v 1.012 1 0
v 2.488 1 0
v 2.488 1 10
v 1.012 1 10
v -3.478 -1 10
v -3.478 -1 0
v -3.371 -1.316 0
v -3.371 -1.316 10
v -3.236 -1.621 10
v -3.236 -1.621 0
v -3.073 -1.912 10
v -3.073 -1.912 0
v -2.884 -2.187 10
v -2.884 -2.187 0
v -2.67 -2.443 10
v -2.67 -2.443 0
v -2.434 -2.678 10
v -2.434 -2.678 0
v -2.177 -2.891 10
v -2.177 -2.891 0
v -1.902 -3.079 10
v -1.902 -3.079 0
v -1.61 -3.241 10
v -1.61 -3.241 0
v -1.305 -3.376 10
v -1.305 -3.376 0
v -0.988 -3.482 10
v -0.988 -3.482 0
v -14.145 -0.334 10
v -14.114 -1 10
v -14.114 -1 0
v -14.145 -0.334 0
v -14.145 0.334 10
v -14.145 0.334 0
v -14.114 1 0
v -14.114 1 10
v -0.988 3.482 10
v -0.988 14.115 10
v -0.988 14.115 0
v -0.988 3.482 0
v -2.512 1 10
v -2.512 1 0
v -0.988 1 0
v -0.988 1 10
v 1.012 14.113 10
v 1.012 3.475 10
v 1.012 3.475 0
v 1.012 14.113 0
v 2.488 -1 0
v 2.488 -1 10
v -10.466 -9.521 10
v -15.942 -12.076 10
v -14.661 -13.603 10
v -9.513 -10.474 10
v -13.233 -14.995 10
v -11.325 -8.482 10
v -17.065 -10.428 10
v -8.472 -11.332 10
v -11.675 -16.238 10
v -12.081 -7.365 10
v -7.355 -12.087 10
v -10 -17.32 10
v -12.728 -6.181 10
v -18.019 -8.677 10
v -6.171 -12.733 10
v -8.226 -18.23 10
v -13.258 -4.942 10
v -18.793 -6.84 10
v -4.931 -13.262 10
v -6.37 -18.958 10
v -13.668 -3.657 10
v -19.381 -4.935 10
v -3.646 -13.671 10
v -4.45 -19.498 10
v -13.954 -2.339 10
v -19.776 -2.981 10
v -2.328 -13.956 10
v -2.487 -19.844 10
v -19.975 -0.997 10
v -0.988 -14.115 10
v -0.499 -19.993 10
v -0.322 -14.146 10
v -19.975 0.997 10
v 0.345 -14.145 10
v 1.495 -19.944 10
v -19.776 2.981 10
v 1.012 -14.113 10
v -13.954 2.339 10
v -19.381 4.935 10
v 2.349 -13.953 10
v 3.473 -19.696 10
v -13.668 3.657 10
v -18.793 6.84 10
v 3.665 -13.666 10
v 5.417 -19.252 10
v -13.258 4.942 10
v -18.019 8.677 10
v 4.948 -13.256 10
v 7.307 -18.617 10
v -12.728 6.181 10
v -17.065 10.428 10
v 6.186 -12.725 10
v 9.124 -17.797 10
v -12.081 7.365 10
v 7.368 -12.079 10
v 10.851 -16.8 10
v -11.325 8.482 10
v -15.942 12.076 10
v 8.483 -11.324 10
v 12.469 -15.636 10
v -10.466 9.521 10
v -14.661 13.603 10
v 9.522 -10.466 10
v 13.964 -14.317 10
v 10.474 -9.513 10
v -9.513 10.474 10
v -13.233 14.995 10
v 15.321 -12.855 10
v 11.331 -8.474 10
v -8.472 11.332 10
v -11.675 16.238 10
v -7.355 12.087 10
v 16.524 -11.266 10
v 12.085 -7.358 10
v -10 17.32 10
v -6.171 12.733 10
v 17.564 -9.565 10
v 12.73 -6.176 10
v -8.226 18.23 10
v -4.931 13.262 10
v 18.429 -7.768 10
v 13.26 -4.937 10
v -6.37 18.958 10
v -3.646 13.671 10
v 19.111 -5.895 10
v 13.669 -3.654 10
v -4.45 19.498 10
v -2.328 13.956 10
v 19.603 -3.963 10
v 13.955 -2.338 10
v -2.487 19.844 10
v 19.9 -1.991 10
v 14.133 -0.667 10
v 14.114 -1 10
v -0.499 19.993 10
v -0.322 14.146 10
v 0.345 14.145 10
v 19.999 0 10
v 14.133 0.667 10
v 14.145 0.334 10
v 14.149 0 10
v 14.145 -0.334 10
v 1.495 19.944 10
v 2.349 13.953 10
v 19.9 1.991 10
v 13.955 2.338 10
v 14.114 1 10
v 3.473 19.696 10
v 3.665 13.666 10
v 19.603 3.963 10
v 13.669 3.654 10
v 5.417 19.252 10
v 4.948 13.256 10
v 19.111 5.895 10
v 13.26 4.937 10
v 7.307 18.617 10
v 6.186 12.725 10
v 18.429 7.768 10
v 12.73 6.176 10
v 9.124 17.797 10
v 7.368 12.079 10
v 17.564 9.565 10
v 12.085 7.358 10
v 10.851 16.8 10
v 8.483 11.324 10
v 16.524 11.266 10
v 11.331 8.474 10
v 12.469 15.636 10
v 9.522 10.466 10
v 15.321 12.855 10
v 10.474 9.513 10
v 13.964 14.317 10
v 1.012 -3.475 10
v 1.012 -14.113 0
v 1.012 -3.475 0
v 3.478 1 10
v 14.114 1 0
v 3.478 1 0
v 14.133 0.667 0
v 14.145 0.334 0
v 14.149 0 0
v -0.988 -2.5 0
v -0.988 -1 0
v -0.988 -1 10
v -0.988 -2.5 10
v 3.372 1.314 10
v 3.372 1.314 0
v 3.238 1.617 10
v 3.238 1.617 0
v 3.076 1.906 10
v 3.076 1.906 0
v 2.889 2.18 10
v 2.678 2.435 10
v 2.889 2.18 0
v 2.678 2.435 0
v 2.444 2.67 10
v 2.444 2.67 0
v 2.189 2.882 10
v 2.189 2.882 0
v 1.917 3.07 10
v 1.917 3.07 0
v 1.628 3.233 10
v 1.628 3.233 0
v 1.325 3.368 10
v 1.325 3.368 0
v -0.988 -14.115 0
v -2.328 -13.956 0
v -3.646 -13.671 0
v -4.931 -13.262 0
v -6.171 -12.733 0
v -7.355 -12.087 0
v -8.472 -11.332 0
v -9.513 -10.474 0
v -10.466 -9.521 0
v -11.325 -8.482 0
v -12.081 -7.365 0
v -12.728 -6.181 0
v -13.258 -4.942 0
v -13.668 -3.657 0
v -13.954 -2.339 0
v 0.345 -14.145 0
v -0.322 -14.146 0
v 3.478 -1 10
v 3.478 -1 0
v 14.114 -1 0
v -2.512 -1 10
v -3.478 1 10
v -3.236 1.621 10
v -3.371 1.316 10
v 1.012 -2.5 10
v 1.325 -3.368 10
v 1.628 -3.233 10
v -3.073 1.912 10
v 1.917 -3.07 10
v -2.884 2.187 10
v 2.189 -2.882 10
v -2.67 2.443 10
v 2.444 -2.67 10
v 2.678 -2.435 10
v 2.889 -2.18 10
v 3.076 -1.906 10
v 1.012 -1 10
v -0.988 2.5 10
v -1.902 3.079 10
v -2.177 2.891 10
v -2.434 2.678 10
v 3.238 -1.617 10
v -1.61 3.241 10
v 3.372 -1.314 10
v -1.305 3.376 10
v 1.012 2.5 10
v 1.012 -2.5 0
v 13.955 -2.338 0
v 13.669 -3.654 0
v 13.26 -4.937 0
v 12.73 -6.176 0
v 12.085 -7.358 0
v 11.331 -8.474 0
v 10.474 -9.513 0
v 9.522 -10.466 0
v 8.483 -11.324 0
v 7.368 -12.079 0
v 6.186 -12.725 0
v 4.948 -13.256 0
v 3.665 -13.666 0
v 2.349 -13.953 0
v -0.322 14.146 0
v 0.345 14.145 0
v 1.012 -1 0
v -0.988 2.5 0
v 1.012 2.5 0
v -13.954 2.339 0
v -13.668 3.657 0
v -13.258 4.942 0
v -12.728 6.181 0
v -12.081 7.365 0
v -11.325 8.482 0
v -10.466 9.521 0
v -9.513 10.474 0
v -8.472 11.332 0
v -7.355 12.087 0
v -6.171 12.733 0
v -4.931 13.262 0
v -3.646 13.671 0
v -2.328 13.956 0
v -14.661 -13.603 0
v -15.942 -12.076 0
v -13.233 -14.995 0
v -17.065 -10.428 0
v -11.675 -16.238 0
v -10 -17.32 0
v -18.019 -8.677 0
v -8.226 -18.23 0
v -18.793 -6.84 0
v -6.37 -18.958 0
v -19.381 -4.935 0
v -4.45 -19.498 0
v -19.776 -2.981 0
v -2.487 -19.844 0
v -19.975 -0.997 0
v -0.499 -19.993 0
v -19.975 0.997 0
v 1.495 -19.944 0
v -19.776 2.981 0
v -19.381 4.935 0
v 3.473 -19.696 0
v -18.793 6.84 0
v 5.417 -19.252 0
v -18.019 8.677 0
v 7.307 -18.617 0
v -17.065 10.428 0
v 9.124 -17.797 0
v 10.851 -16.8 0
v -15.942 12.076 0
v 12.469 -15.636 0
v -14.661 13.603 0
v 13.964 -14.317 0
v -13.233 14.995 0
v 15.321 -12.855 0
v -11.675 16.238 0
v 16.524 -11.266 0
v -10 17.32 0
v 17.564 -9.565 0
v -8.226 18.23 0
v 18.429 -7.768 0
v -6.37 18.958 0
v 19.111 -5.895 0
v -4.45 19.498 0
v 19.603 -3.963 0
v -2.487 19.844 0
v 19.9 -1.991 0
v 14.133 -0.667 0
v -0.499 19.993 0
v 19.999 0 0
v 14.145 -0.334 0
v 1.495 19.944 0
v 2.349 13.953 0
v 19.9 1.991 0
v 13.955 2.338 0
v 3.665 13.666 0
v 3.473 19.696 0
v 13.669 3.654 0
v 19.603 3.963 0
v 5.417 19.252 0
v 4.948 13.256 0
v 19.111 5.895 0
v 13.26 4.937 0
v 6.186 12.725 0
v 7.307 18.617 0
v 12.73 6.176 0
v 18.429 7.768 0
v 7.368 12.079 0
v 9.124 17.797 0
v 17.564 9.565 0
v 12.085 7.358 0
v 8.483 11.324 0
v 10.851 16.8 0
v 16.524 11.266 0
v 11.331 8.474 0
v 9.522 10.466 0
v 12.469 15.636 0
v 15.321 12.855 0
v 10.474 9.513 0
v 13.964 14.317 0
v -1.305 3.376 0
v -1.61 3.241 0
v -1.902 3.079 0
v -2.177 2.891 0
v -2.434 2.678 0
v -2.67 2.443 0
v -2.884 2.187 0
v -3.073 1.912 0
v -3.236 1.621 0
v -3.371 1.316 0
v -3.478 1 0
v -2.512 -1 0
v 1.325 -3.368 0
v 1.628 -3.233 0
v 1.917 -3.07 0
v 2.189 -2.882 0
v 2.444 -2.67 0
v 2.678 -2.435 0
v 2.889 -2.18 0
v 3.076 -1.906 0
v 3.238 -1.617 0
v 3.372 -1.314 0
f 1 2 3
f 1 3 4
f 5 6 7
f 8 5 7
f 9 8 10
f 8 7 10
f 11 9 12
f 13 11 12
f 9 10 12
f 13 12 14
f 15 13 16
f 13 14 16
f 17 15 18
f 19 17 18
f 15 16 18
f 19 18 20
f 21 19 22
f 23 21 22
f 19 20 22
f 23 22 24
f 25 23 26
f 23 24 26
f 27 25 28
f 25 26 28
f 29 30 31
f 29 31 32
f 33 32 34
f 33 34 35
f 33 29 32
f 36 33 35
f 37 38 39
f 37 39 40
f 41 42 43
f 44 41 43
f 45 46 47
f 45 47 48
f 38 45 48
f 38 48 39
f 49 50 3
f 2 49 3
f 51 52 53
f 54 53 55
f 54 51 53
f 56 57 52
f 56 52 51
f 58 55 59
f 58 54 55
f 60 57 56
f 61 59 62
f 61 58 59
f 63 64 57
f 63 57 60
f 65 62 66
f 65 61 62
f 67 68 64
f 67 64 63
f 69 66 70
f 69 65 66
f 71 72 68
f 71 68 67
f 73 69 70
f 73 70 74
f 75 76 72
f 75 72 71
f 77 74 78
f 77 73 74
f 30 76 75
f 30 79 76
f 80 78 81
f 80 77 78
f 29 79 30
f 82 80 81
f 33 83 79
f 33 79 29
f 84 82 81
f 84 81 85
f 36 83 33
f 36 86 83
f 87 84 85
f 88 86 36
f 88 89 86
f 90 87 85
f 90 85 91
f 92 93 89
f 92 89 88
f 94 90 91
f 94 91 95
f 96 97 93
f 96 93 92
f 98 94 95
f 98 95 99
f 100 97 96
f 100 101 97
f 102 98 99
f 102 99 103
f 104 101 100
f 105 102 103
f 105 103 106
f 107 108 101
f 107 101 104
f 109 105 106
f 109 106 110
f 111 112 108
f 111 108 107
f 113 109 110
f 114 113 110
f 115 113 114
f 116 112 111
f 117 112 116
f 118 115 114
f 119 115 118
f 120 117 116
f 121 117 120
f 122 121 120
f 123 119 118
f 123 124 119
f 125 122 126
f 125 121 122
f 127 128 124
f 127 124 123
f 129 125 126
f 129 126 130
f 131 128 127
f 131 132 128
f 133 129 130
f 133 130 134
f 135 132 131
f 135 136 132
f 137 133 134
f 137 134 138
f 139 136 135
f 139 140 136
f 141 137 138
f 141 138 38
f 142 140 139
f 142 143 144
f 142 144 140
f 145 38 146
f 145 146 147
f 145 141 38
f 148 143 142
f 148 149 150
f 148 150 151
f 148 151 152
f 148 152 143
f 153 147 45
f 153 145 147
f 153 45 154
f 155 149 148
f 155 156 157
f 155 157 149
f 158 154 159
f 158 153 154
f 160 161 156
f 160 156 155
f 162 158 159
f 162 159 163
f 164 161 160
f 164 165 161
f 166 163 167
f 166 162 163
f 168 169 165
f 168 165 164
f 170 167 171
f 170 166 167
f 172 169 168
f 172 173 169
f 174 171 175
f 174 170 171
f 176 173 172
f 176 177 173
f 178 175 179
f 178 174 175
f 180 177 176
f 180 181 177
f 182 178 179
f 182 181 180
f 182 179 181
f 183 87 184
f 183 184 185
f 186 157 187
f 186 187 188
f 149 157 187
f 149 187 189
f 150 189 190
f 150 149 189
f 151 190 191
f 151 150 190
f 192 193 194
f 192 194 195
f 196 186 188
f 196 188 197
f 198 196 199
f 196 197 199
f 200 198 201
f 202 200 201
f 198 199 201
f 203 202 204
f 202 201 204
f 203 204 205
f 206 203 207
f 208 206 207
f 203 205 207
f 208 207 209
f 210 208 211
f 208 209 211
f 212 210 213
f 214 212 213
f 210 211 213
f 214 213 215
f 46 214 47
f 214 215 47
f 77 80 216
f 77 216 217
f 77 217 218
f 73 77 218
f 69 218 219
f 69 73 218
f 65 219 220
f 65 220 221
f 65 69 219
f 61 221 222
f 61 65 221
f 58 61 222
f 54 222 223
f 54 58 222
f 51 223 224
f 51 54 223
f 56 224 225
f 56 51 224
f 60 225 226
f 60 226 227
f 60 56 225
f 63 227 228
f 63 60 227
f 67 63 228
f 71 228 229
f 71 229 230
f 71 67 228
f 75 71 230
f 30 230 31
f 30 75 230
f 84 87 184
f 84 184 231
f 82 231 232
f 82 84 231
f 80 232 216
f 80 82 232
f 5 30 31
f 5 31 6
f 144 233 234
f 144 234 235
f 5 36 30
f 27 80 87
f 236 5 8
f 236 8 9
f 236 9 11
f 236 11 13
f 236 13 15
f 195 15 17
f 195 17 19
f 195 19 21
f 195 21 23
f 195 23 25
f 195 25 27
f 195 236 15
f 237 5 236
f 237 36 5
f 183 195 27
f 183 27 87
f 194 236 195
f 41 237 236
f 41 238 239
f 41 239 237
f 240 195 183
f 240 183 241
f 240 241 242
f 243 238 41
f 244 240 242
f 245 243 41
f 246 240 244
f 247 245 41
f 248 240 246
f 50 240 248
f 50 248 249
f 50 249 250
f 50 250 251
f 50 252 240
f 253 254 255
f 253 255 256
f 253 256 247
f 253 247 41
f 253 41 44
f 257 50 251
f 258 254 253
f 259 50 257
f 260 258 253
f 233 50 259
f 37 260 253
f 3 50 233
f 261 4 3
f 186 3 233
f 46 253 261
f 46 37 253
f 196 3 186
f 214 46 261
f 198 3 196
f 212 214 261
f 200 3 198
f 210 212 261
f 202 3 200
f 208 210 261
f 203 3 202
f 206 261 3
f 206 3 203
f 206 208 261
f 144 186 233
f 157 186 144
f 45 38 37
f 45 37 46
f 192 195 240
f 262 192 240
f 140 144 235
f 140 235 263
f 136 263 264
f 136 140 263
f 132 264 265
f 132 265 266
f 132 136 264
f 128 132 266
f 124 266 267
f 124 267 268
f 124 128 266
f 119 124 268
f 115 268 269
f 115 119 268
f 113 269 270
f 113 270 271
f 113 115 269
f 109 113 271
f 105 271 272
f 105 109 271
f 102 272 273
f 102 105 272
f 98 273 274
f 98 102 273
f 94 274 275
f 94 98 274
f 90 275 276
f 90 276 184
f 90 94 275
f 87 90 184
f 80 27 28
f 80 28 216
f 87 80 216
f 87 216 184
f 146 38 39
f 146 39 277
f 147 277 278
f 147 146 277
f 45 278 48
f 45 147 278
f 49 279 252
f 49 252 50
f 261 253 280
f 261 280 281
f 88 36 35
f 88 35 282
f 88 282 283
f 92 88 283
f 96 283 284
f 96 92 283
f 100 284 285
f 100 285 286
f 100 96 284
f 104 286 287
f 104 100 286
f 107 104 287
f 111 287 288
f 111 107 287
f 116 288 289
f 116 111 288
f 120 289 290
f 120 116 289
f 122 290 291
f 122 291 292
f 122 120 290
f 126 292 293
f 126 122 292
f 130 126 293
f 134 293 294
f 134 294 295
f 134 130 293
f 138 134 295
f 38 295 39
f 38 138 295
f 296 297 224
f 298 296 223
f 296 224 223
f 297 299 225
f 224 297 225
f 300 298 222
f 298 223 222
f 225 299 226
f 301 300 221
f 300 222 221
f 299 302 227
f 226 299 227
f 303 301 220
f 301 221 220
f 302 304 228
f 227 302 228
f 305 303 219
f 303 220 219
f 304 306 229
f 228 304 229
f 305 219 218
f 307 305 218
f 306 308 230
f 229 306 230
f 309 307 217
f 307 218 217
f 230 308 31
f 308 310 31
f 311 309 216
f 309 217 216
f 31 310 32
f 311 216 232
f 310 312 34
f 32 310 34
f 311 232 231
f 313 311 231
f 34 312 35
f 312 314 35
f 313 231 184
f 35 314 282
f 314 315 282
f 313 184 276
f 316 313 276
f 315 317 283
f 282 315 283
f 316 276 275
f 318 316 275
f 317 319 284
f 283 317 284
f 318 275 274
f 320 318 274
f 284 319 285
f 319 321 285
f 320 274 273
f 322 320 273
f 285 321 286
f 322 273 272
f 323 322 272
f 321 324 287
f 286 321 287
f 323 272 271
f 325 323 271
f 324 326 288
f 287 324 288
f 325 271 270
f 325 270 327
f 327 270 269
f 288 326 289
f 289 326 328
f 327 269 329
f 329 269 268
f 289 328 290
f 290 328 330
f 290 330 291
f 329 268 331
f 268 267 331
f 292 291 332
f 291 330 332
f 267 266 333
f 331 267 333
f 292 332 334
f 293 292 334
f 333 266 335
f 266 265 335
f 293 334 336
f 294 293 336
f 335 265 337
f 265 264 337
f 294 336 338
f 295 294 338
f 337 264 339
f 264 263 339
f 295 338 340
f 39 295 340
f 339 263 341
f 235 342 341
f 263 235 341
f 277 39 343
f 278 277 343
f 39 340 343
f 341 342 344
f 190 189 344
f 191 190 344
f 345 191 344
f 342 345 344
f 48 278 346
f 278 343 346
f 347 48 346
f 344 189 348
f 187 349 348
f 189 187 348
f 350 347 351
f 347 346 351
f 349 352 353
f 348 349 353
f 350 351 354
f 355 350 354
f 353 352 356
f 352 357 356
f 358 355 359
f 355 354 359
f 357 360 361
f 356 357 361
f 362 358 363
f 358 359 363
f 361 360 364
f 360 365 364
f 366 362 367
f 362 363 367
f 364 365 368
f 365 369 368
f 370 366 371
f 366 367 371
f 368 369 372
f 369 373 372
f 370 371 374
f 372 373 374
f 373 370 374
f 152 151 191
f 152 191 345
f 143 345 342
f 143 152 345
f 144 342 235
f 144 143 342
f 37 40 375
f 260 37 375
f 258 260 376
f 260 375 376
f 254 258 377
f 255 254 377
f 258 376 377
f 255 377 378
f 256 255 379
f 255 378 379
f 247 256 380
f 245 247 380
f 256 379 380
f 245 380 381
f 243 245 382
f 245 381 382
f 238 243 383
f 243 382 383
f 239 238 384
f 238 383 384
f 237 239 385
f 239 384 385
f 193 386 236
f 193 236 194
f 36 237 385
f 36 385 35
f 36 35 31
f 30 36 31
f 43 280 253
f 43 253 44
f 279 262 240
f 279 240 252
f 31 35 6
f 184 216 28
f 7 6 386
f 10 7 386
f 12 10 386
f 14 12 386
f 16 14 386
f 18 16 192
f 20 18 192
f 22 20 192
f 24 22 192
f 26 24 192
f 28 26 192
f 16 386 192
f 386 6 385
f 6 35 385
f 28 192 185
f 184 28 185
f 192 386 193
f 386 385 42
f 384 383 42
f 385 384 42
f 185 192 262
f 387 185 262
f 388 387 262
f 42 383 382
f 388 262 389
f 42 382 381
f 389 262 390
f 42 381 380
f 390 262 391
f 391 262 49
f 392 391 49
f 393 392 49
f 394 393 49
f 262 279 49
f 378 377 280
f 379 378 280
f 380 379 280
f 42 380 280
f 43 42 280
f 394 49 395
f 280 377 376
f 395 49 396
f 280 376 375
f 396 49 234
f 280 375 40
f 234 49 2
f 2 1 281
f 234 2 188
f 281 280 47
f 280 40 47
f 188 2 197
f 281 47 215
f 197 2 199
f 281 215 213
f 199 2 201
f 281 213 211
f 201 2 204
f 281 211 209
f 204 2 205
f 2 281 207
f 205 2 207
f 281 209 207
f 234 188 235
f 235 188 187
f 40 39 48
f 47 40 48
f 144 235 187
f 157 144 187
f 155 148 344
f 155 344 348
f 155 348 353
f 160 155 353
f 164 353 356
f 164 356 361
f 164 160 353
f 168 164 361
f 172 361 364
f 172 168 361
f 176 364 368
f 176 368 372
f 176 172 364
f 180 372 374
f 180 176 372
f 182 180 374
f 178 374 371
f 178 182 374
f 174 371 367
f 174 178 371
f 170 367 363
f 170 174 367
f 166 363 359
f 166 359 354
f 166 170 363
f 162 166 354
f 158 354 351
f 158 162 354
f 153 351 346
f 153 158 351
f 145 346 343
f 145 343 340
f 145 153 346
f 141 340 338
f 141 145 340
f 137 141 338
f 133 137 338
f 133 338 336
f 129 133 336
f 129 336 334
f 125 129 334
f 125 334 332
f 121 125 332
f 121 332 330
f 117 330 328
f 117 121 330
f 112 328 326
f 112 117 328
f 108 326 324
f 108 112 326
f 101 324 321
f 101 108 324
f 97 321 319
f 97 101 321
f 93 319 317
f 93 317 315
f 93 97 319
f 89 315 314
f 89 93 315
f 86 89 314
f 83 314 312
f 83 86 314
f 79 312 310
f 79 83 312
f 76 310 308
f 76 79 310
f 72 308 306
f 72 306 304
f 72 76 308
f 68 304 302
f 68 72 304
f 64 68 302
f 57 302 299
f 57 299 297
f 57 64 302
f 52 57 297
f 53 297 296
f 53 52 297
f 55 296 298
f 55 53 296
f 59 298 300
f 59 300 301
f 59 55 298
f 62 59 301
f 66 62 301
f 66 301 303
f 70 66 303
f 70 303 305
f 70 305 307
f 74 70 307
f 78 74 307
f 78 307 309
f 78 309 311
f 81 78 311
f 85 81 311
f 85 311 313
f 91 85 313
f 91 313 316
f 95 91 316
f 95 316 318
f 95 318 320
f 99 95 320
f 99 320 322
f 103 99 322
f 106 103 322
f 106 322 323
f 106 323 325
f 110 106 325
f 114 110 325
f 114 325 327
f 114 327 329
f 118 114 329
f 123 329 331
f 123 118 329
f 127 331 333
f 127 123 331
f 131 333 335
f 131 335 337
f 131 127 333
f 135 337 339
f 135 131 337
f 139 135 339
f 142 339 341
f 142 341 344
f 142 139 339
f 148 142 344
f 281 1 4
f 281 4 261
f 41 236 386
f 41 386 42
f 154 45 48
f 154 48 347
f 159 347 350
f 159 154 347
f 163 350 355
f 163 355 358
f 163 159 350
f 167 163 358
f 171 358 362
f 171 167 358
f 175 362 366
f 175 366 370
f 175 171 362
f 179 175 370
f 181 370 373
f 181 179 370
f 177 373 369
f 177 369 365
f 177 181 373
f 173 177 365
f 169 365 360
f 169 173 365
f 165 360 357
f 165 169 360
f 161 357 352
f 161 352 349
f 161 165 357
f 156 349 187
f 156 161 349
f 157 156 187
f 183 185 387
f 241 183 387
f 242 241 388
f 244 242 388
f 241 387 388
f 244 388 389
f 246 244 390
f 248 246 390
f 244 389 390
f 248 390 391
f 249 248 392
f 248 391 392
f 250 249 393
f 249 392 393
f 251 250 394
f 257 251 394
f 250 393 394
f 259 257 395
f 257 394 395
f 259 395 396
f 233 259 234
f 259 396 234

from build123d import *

# Parameters (mm, degrees)
F1_R     = 3.619217407
F2_DEPTH = 10
F0_W     = 2
F0_H     = 2
F0_W_2   = 1.4766840935
F0_H_2   = 1.5
F0_W_3   = 1.5233159065
F3_DEPTH = 10
F5_DEPTH = 10
F4_R     = 19.9994931562


# Not quite as in the source:
# - a feature names something its author has since deleted; it is built from what else it names


with BuildPart() as f2:
    # F1 (on Top) → F2 (new body)
    with BuildSketch(Plane.XY):
        Circle(F1_R)
    extrude(amount=F2_DEPTH)

    # F0 (on Top) → F3 (cut)
    with BuildSketch(Plane.XY):
        with Locations((0.0116579533, 0)):
            Rectangle(F0_W, F0_H)
        with Locations((1.75, 0)):
            Rectangle(F0_W_2, F0_H)
        with Locations((0.0116579533, -1.75)):
            Rectangle(F0_W, F0_H_2)
        with Locations((0.0116579533, 1.75)):
            Rectangle(F0_W, F0_H_2)
        with Locations((-1.75, 0)):
            Rectangle(F0_W_3, F0_H)
    extrude(amount=F3_DEPTH, mode=Mode.SUBTRACT)

    # F4 (on face) → F5 (join)
    with BuildSketch(Plane.XY.offset(10)):
        with BuildLine():
            Line((1.0116579533, 3.4749507658), (1.0116579533, 14.1129590508))
            Line((1.0116579533, 14.1129590508), (-0.9883420467, 14.1146110461))
            Line((-0.9883420467, 14.1146110461), (-0.9883420467, 3.4816540089))
            ThreePointArc((-0.9883420467, 3.4816540089), (0.0121301789, 3.6191970791), (1.0116579533, 3.4749507658))
        make_face()
        with BuildLine():
            Line((14.1137898874, -1), (14.1137898874, 1))
            Line((14.1137898874, 1), (3.4783235385, 1))
            ThreePointArc((3.4783235385, 1), (3.5838208477, 0.5049383829), (3.619217407, 0))
            ThreePointArc((3.619217407, 0), (3.5838208477, -0.5049383829), (3.4783235385, -1))
            Line((3.4783235385, -1), (14.1137898874, -1))
        make_face()
        with BuildLine():
            Line((-0.9883420467, -14.1146110461), (1.0116579533, -14.1129590508))
            Line((1.0116579533, -14.1129590508), (1.0116579533, -3.4749507658))
            ThreePointArc((1.0116579533, -3.4749507658), (0.0121301789, -3.6191970791), (-0.9883420467, -3.4816540089))
            Line((-0.9883420467, -3.4816540089), (-0.9883420467, -14.1146110461))
        make_face()
        with BuildLine():
            Line((-3.4783235385, 1), (-14.1137898874, 1))
            Line((-14.1137898874, 1), (-14.1137898874, -1))
            Line((-14.1137898874, -1), (-3.4783235385, -1))
            ThreePointArc((-3.4783235385, -1), (-3.619217407, 0), (-3.4783235385, 1))
        make_face()
    extrude(amount=-F5_DEPTH)

    # F4 (on face) → F5, piece 2 (join)
    with BuildSketch(Plane.XY.offset(10)):
        Circle(F4_R)
        with BuildLine():
            ThreePointArc((14.1137898874, 1), (14.1403236177, 0.5003128735), (14.1491718833, 0))
            ThreePointArc((14.1491718833, 0), (14.1403236177, -0.5003128735), (14.1137898874, -1))
            ThreePointArc((14.1137898874, -1), (10.0091066965, -10.0008423706), (1.0116579533, -14.1129590508))
            ThreePointArc((1.0116579533, -14.1129590508), (0.0116871787, -14.1491670566), (-0.9883420467, -14.1146110461))
            ThreePointArc((-0.9883420467, -14.1146110461), (-10.0008426126, -10.0091064548), (-14.1137898874, -1))
            ThreePointArc((-14.1137898874, -1), (-14.1491718833, 0), (-14.1137898874, 1))
            ThreePointArc((-14.1137898874, 1), (-10.0008426126, 10.0091064548), (-0.9883420467, 14.1146110461))
            ThreePointArc((-0.9883420467, 14.1146110461), (0.0116871787, 14.1491670566), (1.0116579533, 14.1129590508))
            ThreePointArc((1.0116579533, 14.1129590508), (10.0091066965, 10.0008423706), (14.1137898874, 1))
        make_face(mode=Mode.SUBTRACT)
    extrude(amount=-F5_DEPTH)


solid = f2.part
